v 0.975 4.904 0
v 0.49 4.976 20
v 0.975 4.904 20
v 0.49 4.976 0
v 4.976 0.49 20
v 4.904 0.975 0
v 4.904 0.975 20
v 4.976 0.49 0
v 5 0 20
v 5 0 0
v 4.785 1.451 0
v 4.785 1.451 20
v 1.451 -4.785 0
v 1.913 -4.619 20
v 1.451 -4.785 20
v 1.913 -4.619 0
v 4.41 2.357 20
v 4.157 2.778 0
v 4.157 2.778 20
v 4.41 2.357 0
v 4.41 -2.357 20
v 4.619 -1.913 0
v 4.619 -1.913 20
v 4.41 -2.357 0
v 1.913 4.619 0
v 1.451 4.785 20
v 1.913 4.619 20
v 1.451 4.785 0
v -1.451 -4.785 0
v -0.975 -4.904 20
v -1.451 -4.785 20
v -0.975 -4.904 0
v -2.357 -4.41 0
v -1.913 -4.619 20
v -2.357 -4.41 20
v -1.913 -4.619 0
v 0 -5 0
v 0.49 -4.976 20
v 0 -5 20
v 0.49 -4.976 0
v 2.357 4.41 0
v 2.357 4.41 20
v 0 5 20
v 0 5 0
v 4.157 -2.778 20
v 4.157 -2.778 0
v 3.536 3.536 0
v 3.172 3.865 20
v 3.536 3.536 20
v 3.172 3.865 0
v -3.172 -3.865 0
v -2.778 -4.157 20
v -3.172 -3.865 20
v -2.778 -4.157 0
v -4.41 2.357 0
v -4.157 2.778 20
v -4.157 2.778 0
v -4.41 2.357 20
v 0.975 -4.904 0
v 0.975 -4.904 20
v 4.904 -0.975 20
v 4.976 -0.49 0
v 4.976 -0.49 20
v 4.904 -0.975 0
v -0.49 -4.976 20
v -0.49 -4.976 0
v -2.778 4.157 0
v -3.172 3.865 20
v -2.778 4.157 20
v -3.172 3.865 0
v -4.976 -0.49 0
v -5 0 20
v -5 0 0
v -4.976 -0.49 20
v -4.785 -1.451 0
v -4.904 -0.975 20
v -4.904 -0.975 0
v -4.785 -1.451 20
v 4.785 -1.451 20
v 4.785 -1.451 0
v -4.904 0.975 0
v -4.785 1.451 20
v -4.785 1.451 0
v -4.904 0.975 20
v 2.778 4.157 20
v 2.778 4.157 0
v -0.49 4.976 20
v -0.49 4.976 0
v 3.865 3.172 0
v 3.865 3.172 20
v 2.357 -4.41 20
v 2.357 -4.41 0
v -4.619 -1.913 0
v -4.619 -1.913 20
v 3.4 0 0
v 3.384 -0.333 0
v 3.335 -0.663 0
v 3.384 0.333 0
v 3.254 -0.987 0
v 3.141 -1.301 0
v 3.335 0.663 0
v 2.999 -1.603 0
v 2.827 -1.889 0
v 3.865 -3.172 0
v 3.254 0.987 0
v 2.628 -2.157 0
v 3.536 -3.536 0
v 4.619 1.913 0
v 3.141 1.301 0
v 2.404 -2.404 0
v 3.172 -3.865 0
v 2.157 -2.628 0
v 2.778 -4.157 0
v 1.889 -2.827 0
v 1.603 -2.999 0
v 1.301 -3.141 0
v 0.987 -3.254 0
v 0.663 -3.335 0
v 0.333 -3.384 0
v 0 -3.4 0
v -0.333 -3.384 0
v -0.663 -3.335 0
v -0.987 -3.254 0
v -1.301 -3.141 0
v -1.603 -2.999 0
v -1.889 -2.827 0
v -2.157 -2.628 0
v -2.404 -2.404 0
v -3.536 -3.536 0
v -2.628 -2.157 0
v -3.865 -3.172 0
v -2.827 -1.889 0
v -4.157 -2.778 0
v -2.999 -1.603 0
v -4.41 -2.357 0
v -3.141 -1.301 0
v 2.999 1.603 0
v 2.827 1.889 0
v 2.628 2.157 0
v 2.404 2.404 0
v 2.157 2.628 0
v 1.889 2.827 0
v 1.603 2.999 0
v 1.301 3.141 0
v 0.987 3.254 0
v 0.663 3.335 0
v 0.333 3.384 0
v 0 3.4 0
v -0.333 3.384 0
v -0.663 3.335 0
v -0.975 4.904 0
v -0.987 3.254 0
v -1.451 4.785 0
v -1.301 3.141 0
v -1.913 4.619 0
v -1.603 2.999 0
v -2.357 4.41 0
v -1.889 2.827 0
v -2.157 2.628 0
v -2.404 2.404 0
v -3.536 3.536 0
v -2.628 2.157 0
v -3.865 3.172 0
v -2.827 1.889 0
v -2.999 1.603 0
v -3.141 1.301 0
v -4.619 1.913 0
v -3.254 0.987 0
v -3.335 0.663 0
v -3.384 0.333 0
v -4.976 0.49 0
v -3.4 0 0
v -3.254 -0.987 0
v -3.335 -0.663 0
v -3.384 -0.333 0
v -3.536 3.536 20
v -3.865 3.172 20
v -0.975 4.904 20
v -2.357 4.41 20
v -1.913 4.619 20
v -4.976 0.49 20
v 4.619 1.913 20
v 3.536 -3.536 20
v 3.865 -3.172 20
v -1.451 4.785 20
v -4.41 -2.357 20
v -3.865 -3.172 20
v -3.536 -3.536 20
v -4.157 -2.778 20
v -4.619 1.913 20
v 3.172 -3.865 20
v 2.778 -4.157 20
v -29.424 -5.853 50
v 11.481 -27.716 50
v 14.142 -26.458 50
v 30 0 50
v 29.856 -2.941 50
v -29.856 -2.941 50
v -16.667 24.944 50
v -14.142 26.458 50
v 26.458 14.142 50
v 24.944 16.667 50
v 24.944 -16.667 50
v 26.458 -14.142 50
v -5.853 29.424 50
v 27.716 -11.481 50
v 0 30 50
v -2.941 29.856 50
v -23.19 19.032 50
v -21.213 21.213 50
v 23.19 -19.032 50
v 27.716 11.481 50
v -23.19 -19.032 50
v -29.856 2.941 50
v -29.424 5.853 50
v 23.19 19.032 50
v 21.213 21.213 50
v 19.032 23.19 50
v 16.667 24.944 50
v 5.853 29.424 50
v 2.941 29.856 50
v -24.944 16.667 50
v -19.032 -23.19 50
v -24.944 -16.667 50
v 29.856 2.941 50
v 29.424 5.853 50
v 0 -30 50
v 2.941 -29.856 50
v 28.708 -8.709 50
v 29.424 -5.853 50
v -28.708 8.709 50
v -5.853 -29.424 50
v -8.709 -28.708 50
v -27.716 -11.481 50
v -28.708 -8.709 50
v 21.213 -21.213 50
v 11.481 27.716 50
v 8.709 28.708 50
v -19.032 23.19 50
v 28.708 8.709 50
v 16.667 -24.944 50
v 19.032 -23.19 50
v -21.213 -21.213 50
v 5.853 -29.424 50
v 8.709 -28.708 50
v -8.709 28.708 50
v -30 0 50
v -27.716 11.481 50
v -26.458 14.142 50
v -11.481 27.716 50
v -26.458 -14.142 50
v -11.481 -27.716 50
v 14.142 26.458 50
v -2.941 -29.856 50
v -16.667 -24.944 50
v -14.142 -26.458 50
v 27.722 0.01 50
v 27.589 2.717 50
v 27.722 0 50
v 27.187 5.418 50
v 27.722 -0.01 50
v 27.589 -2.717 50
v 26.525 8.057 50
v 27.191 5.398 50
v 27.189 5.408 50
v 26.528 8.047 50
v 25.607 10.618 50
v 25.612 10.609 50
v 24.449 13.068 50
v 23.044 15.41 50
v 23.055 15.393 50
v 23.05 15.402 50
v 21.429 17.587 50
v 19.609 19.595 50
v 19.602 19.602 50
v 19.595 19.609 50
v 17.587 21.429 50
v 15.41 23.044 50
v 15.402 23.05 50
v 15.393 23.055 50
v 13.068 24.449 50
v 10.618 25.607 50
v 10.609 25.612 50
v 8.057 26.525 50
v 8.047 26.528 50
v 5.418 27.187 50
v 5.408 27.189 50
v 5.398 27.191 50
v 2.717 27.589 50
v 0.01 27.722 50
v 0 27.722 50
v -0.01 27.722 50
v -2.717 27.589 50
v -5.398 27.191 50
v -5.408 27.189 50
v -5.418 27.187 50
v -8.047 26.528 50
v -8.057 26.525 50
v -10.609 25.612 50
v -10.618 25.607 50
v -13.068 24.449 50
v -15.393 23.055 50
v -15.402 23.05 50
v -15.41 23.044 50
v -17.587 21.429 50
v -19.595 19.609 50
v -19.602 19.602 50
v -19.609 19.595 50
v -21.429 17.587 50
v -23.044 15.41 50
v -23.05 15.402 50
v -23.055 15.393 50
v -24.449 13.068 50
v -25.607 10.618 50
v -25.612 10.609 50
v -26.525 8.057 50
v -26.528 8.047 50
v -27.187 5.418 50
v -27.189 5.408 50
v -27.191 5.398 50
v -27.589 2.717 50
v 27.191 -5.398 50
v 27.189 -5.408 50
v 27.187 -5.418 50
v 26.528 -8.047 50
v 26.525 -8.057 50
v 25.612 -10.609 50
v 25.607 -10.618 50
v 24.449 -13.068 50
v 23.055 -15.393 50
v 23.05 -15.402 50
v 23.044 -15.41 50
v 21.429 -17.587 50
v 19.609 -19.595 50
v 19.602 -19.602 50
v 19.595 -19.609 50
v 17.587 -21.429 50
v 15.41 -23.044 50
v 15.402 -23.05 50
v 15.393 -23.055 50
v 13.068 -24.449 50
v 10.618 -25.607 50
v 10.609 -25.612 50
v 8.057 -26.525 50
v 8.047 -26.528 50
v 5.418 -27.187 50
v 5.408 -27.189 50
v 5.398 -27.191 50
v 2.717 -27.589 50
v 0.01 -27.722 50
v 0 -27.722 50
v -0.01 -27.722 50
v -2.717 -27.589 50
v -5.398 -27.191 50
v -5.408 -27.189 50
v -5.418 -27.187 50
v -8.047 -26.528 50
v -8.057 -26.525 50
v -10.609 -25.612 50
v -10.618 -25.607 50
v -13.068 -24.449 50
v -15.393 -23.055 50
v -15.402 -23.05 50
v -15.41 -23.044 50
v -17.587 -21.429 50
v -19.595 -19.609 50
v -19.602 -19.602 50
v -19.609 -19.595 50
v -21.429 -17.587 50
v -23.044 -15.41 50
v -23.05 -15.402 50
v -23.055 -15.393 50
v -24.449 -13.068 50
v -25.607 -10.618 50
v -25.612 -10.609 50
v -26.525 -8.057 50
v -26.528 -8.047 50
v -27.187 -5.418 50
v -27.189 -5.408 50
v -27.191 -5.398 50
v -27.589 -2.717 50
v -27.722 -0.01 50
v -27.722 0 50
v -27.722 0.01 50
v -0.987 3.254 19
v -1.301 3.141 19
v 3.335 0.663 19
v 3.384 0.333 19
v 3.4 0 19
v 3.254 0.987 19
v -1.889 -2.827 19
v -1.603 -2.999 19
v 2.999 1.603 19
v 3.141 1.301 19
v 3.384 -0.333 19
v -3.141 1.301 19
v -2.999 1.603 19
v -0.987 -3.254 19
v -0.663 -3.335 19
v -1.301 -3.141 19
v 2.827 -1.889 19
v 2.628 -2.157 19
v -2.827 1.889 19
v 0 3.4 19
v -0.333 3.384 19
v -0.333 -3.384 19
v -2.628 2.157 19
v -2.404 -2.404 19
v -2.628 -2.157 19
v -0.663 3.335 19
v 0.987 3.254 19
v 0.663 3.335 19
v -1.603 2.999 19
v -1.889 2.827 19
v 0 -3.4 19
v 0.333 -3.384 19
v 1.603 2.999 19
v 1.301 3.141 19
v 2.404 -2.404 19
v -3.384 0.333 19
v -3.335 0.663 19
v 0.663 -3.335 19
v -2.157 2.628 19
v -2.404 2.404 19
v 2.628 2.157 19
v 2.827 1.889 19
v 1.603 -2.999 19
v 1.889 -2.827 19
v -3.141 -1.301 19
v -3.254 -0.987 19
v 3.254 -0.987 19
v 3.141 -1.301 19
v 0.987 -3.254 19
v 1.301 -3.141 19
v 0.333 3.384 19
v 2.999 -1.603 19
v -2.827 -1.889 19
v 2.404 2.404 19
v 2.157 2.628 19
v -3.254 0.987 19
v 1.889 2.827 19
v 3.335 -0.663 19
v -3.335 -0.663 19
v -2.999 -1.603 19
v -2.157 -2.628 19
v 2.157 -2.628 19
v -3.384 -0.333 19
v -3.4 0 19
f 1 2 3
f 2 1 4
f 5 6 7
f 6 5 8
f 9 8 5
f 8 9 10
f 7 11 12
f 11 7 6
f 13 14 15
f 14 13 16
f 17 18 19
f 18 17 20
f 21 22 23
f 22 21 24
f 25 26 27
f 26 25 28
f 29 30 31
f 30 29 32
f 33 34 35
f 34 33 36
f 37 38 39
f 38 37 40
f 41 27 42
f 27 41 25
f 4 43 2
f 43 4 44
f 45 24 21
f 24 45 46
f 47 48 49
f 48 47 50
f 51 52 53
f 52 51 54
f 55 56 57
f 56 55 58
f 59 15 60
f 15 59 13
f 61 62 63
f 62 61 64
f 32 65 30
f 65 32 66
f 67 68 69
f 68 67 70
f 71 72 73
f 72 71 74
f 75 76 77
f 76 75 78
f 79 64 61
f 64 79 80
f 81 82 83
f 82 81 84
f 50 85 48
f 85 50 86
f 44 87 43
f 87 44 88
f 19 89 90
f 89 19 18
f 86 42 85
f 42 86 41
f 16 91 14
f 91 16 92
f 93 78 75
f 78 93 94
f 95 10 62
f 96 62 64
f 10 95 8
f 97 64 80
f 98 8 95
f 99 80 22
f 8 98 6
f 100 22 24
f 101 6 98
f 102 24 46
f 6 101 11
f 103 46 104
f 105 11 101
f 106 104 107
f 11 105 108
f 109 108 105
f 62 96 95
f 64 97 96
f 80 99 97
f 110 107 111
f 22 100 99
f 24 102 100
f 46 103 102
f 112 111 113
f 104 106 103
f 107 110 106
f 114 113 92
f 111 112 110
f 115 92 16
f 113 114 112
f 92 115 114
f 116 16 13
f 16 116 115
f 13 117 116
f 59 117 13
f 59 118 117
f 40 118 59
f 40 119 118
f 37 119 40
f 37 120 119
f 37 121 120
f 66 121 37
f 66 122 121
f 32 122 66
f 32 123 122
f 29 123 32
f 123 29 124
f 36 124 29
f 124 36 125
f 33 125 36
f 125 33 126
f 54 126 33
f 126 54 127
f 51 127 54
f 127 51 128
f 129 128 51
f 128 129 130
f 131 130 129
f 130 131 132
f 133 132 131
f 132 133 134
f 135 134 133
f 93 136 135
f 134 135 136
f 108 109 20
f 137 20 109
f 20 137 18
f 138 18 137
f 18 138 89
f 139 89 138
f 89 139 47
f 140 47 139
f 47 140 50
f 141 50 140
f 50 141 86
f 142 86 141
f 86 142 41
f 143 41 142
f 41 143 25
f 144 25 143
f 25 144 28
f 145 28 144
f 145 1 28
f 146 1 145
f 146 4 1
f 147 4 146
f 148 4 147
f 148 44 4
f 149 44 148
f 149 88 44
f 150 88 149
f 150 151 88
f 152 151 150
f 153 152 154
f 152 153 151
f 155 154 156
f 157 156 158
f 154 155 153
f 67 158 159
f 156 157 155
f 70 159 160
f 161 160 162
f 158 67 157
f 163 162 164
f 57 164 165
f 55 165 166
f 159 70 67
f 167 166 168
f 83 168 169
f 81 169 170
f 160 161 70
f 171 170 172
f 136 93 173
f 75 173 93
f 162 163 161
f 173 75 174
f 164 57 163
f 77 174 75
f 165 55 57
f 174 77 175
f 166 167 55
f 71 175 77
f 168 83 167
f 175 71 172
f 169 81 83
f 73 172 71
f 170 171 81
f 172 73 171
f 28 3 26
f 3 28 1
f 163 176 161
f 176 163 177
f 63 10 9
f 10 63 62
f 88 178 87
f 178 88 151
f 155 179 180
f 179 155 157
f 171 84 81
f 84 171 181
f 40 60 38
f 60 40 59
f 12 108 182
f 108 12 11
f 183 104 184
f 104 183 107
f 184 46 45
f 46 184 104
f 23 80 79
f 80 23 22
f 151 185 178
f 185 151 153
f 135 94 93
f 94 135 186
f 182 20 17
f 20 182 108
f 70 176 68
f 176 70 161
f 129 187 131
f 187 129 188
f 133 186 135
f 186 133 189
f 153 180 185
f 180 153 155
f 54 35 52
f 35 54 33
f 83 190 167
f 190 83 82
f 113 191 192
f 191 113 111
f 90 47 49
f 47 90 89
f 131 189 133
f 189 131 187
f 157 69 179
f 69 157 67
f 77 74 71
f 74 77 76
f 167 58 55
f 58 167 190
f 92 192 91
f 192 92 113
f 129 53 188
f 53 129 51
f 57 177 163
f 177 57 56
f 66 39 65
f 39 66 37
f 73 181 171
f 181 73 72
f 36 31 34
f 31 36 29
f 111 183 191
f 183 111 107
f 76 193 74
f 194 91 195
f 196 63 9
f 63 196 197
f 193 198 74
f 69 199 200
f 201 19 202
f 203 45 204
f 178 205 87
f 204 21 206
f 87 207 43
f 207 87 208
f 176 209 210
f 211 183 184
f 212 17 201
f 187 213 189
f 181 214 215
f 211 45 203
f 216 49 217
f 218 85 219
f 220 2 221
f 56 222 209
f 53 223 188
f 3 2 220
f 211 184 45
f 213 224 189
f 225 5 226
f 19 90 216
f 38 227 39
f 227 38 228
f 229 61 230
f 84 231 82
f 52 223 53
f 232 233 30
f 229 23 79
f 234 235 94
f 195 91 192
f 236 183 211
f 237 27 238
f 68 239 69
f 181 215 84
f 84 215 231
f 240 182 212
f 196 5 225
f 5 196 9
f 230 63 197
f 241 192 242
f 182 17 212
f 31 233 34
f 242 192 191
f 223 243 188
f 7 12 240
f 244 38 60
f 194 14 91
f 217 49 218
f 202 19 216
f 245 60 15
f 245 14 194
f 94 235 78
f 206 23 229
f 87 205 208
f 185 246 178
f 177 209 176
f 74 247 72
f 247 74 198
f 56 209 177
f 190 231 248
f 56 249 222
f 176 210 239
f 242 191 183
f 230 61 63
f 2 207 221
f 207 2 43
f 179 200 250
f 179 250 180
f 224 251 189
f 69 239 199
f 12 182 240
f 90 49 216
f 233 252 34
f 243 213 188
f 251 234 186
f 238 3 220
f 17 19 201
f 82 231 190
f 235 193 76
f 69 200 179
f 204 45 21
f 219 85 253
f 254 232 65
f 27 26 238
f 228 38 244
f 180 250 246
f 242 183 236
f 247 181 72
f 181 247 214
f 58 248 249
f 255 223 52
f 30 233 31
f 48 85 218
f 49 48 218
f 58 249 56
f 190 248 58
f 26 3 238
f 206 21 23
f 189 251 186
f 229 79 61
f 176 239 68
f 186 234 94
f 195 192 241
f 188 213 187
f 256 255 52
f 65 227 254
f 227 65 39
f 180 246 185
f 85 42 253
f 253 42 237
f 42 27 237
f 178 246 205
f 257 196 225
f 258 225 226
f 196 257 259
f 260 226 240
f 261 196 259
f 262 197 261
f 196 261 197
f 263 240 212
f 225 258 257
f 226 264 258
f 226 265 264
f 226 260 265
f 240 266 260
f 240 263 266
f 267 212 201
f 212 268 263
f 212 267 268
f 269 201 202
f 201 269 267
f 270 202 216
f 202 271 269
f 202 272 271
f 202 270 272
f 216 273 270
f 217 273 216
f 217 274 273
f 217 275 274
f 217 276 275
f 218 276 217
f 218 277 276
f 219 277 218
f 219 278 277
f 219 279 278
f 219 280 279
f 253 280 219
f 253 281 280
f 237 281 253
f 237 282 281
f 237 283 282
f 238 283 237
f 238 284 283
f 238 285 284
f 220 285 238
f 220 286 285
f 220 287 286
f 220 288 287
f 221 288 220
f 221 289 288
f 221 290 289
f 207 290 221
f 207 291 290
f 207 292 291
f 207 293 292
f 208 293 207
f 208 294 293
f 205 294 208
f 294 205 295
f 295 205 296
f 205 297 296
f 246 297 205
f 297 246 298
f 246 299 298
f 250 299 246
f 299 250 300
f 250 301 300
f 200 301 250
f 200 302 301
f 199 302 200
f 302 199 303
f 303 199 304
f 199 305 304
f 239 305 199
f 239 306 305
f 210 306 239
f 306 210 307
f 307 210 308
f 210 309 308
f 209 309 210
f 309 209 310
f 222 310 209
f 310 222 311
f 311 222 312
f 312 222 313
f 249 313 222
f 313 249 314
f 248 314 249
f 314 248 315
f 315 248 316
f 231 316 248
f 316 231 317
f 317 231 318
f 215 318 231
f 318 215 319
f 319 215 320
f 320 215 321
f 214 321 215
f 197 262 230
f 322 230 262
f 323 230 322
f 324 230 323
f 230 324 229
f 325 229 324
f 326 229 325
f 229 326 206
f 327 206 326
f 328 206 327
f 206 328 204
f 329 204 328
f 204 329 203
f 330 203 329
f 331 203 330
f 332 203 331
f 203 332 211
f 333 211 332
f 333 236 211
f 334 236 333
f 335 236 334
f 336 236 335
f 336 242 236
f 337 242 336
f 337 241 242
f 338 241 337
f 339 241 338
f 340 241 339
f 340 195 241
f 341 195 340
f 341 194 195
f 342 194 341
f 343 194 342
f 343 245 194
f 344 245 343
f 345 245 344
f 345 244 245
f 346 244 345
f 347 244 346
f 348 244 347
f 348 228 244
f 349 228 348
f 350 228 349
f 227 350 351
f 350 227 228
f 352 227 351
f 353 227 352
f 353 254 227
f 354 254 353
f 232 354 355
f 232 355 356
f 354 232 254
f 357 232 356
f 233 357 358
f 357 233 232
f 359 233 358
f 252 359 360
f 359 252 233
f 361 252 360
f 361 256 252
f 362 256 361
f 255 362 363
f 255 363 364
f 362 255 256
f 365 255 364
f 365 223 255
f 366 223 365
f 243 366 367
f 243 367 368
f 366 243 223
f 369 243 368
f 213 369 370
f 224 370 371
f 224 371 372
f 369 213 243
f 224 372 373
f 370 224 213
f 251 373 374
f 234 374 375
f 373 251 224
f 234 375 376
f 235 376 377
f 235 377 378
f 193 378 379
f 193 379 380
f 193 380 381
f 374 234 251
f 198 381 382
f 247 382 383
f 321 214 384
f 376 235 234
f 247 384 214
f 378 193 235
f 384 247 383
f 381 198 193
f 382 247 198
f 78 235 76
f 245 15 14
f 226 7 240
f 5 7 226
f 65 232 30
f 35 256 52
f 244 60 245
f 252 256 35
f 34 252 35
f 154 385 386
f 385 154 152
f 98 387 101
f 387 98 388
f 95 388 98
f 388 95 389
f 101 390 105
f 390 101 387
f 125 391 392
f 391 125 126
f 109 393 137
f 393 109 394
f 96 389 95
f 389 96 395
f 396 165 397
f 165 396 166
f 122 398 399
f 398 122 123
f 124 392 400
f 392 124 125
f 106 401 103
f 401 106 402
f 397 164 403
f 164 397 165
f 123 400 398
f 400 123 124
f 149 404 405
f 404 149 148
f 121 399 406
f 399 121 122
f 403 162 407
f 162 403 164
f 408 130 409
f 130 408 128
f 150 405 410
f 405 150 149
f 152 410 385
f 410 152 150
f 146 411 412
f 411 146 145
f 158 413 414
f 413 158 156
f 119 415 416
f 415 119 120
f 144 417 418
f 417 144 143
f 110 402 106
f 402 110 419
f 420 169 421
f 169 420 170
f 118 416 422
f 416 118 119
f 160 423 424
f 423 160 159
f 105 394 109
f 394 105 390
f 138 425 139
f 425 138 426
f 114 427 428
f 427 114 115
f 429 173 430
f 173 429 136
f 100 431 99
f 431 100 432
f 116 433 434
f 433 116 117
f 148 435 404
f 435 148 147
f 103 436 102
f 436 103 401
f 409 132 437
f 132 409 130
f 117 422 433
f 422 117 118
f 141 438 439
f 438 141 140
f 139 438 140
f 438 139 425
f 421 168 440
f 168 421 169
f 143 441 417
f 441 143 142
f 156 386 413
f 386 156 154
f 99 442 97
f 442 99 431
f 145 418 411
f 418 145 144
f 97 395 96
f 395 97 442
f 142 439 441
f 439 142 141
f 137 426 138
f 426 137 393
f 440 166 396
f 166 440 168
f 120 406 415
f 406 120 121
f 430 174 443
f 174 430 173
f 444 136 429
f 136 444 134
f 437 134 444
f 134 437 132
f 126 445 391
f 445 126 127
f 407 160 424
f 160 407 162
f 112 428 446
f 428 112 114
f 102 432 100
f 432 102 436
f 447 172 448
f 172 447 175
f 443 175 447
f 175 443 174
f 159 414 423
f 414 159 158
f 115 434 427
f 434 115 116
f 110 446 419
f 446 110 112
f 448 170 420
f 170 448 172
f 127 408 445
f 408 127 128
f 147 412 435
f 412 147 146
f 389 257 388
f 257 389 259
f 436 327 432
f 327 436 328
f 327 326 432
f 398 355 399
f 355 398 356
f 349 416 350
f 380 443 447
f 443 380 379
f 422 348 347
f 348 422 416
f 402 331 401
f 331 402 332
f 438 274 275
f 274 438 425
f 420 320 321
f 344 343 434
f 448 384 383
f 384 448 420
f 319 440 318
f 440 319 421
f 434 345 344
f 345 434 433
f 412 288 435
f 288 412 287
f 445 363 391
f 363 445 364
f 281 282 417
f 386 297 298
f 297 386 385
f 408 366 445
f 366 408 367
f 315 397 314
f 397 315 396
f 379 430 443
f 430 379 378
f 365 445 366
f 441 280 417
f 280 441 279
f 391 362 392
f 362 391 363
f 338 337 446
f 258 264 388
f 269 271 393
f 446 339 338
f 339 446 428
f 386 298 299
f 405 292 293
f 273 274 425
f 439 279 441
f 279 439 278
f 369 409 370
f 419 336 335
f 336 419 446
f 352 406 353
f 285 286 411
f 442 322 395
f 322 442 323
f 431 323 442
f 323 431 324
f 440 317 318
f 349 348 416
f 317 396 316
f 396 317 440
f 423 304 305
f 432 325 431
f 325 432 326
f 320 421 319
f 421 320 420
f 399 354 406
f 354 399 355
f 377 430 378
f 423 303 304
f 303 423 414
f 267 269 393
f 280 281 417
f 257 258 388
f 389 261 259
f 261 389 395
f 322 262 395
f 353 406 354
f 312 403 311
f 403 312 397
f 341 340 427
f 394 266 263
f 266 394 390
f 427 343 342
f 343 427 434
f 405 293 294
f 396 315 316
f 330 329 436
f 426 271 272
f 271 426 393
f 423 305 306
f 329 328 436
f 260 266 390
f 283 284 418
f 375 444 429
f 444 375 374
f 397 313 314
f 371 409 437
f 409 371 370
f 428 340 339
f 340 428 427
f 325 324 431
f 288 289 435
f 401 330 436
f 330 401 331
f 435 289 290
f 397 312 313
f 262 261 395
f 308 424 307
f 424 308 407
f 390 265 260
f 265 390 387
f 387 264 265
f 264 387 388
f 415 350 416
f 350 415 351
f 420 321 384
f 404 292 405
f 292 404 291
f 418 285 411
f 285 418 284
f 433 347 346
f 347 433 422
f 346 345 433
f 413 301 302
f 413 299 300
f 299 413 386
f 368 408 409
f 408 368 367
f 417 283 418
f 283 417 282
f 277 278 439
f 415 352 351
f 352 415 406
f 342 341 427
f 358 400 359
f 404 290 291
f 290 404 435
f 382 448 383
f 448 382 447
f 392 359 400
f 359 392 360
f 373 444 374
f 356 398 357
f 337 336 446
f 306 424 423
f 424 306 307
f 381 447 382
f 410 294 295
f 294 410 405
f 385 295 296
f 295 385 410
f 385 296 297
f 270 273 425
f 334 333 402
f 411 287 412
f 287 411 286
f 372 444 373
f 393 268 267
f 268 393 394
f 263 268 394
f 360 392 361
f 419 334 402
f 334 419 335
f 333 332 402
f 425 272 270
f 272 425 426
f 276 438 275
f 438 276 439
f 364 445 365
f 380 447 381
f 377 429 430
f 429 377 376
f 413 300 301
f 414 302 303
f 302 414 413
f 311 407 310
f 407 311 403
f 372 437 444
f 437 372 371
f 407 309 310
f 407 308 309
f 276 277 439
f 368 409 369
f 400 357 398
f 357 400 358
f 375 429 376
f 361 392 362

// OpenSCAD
// Small lab funnel, printed upright (wide opening at top).
// All dimensions in mm.

// ---- Named dimensions (measured with calipers) ----
spout_od   = 10;    // spout outer diameter
spout_id   = 6.8;   // spout bore (inner diameter)
spout_h    = 20;    // spout height (z = 0 to z = 20)
cone_od    = 60;    // cone outer diameter at rim (z = 50)
cone_id    = 56.8;  // cone inner diameter at rim (cone_od - 2*wall)
cone_h     = 30;    // cone height (z = 20 to z = 50)
wall       = 1.6;   // uniform wall thickness

// ---- Curvature resolution ----
$fn = 64;

// ---- Build the funnel as a single solid, then hollow it ----
// Outer profile: straight spout cylinder + widening cone on top.
// Inner profile: straight bore through the spout + conical bore through the cone.
// The difference leaves a 1.6 mm wall everywhere and open top/bottom.

difference() {
    // Outer solid
    union() {
        // Spout: straight tube, z = 0 to z = 20
        cylinder(h = spout_h, d = spout_od, $fn = $fn);

        // Cone: widens from spout_od at z = 20 to cone_od at z = 50
        translate([0, 0, spout_h])
            cylinder(h = cone_h, d1 = spout_od, d2 = cone_od, $fn = $fn);
    }

    // Inner bore (cutting shape extends 1 mm past both open faces)
    union() {
        // Spout bore: straight, z = -1 to z = 21
        translate([0, 0, -1])
            cylinder(h = spout_h + 2, d = spout_id, $fn = $fn);

        // Cone bore: conical, z = 19 to z = 51
        // At z = 19 (1 mm below the spout/cone junction) the inner cone
        // diameter equals spout_id, so it blends smoothly into the spout bore.
        // At z = 51 (1 mm past the rim) it is slightly larger than cone_id.
        translate([0, 0, 19])
            cylinder(h = 32, d1 = spout_id, d2 = cone_id + 2 * wall * (2 / cone_h), $fn = $fn);
    }
}
